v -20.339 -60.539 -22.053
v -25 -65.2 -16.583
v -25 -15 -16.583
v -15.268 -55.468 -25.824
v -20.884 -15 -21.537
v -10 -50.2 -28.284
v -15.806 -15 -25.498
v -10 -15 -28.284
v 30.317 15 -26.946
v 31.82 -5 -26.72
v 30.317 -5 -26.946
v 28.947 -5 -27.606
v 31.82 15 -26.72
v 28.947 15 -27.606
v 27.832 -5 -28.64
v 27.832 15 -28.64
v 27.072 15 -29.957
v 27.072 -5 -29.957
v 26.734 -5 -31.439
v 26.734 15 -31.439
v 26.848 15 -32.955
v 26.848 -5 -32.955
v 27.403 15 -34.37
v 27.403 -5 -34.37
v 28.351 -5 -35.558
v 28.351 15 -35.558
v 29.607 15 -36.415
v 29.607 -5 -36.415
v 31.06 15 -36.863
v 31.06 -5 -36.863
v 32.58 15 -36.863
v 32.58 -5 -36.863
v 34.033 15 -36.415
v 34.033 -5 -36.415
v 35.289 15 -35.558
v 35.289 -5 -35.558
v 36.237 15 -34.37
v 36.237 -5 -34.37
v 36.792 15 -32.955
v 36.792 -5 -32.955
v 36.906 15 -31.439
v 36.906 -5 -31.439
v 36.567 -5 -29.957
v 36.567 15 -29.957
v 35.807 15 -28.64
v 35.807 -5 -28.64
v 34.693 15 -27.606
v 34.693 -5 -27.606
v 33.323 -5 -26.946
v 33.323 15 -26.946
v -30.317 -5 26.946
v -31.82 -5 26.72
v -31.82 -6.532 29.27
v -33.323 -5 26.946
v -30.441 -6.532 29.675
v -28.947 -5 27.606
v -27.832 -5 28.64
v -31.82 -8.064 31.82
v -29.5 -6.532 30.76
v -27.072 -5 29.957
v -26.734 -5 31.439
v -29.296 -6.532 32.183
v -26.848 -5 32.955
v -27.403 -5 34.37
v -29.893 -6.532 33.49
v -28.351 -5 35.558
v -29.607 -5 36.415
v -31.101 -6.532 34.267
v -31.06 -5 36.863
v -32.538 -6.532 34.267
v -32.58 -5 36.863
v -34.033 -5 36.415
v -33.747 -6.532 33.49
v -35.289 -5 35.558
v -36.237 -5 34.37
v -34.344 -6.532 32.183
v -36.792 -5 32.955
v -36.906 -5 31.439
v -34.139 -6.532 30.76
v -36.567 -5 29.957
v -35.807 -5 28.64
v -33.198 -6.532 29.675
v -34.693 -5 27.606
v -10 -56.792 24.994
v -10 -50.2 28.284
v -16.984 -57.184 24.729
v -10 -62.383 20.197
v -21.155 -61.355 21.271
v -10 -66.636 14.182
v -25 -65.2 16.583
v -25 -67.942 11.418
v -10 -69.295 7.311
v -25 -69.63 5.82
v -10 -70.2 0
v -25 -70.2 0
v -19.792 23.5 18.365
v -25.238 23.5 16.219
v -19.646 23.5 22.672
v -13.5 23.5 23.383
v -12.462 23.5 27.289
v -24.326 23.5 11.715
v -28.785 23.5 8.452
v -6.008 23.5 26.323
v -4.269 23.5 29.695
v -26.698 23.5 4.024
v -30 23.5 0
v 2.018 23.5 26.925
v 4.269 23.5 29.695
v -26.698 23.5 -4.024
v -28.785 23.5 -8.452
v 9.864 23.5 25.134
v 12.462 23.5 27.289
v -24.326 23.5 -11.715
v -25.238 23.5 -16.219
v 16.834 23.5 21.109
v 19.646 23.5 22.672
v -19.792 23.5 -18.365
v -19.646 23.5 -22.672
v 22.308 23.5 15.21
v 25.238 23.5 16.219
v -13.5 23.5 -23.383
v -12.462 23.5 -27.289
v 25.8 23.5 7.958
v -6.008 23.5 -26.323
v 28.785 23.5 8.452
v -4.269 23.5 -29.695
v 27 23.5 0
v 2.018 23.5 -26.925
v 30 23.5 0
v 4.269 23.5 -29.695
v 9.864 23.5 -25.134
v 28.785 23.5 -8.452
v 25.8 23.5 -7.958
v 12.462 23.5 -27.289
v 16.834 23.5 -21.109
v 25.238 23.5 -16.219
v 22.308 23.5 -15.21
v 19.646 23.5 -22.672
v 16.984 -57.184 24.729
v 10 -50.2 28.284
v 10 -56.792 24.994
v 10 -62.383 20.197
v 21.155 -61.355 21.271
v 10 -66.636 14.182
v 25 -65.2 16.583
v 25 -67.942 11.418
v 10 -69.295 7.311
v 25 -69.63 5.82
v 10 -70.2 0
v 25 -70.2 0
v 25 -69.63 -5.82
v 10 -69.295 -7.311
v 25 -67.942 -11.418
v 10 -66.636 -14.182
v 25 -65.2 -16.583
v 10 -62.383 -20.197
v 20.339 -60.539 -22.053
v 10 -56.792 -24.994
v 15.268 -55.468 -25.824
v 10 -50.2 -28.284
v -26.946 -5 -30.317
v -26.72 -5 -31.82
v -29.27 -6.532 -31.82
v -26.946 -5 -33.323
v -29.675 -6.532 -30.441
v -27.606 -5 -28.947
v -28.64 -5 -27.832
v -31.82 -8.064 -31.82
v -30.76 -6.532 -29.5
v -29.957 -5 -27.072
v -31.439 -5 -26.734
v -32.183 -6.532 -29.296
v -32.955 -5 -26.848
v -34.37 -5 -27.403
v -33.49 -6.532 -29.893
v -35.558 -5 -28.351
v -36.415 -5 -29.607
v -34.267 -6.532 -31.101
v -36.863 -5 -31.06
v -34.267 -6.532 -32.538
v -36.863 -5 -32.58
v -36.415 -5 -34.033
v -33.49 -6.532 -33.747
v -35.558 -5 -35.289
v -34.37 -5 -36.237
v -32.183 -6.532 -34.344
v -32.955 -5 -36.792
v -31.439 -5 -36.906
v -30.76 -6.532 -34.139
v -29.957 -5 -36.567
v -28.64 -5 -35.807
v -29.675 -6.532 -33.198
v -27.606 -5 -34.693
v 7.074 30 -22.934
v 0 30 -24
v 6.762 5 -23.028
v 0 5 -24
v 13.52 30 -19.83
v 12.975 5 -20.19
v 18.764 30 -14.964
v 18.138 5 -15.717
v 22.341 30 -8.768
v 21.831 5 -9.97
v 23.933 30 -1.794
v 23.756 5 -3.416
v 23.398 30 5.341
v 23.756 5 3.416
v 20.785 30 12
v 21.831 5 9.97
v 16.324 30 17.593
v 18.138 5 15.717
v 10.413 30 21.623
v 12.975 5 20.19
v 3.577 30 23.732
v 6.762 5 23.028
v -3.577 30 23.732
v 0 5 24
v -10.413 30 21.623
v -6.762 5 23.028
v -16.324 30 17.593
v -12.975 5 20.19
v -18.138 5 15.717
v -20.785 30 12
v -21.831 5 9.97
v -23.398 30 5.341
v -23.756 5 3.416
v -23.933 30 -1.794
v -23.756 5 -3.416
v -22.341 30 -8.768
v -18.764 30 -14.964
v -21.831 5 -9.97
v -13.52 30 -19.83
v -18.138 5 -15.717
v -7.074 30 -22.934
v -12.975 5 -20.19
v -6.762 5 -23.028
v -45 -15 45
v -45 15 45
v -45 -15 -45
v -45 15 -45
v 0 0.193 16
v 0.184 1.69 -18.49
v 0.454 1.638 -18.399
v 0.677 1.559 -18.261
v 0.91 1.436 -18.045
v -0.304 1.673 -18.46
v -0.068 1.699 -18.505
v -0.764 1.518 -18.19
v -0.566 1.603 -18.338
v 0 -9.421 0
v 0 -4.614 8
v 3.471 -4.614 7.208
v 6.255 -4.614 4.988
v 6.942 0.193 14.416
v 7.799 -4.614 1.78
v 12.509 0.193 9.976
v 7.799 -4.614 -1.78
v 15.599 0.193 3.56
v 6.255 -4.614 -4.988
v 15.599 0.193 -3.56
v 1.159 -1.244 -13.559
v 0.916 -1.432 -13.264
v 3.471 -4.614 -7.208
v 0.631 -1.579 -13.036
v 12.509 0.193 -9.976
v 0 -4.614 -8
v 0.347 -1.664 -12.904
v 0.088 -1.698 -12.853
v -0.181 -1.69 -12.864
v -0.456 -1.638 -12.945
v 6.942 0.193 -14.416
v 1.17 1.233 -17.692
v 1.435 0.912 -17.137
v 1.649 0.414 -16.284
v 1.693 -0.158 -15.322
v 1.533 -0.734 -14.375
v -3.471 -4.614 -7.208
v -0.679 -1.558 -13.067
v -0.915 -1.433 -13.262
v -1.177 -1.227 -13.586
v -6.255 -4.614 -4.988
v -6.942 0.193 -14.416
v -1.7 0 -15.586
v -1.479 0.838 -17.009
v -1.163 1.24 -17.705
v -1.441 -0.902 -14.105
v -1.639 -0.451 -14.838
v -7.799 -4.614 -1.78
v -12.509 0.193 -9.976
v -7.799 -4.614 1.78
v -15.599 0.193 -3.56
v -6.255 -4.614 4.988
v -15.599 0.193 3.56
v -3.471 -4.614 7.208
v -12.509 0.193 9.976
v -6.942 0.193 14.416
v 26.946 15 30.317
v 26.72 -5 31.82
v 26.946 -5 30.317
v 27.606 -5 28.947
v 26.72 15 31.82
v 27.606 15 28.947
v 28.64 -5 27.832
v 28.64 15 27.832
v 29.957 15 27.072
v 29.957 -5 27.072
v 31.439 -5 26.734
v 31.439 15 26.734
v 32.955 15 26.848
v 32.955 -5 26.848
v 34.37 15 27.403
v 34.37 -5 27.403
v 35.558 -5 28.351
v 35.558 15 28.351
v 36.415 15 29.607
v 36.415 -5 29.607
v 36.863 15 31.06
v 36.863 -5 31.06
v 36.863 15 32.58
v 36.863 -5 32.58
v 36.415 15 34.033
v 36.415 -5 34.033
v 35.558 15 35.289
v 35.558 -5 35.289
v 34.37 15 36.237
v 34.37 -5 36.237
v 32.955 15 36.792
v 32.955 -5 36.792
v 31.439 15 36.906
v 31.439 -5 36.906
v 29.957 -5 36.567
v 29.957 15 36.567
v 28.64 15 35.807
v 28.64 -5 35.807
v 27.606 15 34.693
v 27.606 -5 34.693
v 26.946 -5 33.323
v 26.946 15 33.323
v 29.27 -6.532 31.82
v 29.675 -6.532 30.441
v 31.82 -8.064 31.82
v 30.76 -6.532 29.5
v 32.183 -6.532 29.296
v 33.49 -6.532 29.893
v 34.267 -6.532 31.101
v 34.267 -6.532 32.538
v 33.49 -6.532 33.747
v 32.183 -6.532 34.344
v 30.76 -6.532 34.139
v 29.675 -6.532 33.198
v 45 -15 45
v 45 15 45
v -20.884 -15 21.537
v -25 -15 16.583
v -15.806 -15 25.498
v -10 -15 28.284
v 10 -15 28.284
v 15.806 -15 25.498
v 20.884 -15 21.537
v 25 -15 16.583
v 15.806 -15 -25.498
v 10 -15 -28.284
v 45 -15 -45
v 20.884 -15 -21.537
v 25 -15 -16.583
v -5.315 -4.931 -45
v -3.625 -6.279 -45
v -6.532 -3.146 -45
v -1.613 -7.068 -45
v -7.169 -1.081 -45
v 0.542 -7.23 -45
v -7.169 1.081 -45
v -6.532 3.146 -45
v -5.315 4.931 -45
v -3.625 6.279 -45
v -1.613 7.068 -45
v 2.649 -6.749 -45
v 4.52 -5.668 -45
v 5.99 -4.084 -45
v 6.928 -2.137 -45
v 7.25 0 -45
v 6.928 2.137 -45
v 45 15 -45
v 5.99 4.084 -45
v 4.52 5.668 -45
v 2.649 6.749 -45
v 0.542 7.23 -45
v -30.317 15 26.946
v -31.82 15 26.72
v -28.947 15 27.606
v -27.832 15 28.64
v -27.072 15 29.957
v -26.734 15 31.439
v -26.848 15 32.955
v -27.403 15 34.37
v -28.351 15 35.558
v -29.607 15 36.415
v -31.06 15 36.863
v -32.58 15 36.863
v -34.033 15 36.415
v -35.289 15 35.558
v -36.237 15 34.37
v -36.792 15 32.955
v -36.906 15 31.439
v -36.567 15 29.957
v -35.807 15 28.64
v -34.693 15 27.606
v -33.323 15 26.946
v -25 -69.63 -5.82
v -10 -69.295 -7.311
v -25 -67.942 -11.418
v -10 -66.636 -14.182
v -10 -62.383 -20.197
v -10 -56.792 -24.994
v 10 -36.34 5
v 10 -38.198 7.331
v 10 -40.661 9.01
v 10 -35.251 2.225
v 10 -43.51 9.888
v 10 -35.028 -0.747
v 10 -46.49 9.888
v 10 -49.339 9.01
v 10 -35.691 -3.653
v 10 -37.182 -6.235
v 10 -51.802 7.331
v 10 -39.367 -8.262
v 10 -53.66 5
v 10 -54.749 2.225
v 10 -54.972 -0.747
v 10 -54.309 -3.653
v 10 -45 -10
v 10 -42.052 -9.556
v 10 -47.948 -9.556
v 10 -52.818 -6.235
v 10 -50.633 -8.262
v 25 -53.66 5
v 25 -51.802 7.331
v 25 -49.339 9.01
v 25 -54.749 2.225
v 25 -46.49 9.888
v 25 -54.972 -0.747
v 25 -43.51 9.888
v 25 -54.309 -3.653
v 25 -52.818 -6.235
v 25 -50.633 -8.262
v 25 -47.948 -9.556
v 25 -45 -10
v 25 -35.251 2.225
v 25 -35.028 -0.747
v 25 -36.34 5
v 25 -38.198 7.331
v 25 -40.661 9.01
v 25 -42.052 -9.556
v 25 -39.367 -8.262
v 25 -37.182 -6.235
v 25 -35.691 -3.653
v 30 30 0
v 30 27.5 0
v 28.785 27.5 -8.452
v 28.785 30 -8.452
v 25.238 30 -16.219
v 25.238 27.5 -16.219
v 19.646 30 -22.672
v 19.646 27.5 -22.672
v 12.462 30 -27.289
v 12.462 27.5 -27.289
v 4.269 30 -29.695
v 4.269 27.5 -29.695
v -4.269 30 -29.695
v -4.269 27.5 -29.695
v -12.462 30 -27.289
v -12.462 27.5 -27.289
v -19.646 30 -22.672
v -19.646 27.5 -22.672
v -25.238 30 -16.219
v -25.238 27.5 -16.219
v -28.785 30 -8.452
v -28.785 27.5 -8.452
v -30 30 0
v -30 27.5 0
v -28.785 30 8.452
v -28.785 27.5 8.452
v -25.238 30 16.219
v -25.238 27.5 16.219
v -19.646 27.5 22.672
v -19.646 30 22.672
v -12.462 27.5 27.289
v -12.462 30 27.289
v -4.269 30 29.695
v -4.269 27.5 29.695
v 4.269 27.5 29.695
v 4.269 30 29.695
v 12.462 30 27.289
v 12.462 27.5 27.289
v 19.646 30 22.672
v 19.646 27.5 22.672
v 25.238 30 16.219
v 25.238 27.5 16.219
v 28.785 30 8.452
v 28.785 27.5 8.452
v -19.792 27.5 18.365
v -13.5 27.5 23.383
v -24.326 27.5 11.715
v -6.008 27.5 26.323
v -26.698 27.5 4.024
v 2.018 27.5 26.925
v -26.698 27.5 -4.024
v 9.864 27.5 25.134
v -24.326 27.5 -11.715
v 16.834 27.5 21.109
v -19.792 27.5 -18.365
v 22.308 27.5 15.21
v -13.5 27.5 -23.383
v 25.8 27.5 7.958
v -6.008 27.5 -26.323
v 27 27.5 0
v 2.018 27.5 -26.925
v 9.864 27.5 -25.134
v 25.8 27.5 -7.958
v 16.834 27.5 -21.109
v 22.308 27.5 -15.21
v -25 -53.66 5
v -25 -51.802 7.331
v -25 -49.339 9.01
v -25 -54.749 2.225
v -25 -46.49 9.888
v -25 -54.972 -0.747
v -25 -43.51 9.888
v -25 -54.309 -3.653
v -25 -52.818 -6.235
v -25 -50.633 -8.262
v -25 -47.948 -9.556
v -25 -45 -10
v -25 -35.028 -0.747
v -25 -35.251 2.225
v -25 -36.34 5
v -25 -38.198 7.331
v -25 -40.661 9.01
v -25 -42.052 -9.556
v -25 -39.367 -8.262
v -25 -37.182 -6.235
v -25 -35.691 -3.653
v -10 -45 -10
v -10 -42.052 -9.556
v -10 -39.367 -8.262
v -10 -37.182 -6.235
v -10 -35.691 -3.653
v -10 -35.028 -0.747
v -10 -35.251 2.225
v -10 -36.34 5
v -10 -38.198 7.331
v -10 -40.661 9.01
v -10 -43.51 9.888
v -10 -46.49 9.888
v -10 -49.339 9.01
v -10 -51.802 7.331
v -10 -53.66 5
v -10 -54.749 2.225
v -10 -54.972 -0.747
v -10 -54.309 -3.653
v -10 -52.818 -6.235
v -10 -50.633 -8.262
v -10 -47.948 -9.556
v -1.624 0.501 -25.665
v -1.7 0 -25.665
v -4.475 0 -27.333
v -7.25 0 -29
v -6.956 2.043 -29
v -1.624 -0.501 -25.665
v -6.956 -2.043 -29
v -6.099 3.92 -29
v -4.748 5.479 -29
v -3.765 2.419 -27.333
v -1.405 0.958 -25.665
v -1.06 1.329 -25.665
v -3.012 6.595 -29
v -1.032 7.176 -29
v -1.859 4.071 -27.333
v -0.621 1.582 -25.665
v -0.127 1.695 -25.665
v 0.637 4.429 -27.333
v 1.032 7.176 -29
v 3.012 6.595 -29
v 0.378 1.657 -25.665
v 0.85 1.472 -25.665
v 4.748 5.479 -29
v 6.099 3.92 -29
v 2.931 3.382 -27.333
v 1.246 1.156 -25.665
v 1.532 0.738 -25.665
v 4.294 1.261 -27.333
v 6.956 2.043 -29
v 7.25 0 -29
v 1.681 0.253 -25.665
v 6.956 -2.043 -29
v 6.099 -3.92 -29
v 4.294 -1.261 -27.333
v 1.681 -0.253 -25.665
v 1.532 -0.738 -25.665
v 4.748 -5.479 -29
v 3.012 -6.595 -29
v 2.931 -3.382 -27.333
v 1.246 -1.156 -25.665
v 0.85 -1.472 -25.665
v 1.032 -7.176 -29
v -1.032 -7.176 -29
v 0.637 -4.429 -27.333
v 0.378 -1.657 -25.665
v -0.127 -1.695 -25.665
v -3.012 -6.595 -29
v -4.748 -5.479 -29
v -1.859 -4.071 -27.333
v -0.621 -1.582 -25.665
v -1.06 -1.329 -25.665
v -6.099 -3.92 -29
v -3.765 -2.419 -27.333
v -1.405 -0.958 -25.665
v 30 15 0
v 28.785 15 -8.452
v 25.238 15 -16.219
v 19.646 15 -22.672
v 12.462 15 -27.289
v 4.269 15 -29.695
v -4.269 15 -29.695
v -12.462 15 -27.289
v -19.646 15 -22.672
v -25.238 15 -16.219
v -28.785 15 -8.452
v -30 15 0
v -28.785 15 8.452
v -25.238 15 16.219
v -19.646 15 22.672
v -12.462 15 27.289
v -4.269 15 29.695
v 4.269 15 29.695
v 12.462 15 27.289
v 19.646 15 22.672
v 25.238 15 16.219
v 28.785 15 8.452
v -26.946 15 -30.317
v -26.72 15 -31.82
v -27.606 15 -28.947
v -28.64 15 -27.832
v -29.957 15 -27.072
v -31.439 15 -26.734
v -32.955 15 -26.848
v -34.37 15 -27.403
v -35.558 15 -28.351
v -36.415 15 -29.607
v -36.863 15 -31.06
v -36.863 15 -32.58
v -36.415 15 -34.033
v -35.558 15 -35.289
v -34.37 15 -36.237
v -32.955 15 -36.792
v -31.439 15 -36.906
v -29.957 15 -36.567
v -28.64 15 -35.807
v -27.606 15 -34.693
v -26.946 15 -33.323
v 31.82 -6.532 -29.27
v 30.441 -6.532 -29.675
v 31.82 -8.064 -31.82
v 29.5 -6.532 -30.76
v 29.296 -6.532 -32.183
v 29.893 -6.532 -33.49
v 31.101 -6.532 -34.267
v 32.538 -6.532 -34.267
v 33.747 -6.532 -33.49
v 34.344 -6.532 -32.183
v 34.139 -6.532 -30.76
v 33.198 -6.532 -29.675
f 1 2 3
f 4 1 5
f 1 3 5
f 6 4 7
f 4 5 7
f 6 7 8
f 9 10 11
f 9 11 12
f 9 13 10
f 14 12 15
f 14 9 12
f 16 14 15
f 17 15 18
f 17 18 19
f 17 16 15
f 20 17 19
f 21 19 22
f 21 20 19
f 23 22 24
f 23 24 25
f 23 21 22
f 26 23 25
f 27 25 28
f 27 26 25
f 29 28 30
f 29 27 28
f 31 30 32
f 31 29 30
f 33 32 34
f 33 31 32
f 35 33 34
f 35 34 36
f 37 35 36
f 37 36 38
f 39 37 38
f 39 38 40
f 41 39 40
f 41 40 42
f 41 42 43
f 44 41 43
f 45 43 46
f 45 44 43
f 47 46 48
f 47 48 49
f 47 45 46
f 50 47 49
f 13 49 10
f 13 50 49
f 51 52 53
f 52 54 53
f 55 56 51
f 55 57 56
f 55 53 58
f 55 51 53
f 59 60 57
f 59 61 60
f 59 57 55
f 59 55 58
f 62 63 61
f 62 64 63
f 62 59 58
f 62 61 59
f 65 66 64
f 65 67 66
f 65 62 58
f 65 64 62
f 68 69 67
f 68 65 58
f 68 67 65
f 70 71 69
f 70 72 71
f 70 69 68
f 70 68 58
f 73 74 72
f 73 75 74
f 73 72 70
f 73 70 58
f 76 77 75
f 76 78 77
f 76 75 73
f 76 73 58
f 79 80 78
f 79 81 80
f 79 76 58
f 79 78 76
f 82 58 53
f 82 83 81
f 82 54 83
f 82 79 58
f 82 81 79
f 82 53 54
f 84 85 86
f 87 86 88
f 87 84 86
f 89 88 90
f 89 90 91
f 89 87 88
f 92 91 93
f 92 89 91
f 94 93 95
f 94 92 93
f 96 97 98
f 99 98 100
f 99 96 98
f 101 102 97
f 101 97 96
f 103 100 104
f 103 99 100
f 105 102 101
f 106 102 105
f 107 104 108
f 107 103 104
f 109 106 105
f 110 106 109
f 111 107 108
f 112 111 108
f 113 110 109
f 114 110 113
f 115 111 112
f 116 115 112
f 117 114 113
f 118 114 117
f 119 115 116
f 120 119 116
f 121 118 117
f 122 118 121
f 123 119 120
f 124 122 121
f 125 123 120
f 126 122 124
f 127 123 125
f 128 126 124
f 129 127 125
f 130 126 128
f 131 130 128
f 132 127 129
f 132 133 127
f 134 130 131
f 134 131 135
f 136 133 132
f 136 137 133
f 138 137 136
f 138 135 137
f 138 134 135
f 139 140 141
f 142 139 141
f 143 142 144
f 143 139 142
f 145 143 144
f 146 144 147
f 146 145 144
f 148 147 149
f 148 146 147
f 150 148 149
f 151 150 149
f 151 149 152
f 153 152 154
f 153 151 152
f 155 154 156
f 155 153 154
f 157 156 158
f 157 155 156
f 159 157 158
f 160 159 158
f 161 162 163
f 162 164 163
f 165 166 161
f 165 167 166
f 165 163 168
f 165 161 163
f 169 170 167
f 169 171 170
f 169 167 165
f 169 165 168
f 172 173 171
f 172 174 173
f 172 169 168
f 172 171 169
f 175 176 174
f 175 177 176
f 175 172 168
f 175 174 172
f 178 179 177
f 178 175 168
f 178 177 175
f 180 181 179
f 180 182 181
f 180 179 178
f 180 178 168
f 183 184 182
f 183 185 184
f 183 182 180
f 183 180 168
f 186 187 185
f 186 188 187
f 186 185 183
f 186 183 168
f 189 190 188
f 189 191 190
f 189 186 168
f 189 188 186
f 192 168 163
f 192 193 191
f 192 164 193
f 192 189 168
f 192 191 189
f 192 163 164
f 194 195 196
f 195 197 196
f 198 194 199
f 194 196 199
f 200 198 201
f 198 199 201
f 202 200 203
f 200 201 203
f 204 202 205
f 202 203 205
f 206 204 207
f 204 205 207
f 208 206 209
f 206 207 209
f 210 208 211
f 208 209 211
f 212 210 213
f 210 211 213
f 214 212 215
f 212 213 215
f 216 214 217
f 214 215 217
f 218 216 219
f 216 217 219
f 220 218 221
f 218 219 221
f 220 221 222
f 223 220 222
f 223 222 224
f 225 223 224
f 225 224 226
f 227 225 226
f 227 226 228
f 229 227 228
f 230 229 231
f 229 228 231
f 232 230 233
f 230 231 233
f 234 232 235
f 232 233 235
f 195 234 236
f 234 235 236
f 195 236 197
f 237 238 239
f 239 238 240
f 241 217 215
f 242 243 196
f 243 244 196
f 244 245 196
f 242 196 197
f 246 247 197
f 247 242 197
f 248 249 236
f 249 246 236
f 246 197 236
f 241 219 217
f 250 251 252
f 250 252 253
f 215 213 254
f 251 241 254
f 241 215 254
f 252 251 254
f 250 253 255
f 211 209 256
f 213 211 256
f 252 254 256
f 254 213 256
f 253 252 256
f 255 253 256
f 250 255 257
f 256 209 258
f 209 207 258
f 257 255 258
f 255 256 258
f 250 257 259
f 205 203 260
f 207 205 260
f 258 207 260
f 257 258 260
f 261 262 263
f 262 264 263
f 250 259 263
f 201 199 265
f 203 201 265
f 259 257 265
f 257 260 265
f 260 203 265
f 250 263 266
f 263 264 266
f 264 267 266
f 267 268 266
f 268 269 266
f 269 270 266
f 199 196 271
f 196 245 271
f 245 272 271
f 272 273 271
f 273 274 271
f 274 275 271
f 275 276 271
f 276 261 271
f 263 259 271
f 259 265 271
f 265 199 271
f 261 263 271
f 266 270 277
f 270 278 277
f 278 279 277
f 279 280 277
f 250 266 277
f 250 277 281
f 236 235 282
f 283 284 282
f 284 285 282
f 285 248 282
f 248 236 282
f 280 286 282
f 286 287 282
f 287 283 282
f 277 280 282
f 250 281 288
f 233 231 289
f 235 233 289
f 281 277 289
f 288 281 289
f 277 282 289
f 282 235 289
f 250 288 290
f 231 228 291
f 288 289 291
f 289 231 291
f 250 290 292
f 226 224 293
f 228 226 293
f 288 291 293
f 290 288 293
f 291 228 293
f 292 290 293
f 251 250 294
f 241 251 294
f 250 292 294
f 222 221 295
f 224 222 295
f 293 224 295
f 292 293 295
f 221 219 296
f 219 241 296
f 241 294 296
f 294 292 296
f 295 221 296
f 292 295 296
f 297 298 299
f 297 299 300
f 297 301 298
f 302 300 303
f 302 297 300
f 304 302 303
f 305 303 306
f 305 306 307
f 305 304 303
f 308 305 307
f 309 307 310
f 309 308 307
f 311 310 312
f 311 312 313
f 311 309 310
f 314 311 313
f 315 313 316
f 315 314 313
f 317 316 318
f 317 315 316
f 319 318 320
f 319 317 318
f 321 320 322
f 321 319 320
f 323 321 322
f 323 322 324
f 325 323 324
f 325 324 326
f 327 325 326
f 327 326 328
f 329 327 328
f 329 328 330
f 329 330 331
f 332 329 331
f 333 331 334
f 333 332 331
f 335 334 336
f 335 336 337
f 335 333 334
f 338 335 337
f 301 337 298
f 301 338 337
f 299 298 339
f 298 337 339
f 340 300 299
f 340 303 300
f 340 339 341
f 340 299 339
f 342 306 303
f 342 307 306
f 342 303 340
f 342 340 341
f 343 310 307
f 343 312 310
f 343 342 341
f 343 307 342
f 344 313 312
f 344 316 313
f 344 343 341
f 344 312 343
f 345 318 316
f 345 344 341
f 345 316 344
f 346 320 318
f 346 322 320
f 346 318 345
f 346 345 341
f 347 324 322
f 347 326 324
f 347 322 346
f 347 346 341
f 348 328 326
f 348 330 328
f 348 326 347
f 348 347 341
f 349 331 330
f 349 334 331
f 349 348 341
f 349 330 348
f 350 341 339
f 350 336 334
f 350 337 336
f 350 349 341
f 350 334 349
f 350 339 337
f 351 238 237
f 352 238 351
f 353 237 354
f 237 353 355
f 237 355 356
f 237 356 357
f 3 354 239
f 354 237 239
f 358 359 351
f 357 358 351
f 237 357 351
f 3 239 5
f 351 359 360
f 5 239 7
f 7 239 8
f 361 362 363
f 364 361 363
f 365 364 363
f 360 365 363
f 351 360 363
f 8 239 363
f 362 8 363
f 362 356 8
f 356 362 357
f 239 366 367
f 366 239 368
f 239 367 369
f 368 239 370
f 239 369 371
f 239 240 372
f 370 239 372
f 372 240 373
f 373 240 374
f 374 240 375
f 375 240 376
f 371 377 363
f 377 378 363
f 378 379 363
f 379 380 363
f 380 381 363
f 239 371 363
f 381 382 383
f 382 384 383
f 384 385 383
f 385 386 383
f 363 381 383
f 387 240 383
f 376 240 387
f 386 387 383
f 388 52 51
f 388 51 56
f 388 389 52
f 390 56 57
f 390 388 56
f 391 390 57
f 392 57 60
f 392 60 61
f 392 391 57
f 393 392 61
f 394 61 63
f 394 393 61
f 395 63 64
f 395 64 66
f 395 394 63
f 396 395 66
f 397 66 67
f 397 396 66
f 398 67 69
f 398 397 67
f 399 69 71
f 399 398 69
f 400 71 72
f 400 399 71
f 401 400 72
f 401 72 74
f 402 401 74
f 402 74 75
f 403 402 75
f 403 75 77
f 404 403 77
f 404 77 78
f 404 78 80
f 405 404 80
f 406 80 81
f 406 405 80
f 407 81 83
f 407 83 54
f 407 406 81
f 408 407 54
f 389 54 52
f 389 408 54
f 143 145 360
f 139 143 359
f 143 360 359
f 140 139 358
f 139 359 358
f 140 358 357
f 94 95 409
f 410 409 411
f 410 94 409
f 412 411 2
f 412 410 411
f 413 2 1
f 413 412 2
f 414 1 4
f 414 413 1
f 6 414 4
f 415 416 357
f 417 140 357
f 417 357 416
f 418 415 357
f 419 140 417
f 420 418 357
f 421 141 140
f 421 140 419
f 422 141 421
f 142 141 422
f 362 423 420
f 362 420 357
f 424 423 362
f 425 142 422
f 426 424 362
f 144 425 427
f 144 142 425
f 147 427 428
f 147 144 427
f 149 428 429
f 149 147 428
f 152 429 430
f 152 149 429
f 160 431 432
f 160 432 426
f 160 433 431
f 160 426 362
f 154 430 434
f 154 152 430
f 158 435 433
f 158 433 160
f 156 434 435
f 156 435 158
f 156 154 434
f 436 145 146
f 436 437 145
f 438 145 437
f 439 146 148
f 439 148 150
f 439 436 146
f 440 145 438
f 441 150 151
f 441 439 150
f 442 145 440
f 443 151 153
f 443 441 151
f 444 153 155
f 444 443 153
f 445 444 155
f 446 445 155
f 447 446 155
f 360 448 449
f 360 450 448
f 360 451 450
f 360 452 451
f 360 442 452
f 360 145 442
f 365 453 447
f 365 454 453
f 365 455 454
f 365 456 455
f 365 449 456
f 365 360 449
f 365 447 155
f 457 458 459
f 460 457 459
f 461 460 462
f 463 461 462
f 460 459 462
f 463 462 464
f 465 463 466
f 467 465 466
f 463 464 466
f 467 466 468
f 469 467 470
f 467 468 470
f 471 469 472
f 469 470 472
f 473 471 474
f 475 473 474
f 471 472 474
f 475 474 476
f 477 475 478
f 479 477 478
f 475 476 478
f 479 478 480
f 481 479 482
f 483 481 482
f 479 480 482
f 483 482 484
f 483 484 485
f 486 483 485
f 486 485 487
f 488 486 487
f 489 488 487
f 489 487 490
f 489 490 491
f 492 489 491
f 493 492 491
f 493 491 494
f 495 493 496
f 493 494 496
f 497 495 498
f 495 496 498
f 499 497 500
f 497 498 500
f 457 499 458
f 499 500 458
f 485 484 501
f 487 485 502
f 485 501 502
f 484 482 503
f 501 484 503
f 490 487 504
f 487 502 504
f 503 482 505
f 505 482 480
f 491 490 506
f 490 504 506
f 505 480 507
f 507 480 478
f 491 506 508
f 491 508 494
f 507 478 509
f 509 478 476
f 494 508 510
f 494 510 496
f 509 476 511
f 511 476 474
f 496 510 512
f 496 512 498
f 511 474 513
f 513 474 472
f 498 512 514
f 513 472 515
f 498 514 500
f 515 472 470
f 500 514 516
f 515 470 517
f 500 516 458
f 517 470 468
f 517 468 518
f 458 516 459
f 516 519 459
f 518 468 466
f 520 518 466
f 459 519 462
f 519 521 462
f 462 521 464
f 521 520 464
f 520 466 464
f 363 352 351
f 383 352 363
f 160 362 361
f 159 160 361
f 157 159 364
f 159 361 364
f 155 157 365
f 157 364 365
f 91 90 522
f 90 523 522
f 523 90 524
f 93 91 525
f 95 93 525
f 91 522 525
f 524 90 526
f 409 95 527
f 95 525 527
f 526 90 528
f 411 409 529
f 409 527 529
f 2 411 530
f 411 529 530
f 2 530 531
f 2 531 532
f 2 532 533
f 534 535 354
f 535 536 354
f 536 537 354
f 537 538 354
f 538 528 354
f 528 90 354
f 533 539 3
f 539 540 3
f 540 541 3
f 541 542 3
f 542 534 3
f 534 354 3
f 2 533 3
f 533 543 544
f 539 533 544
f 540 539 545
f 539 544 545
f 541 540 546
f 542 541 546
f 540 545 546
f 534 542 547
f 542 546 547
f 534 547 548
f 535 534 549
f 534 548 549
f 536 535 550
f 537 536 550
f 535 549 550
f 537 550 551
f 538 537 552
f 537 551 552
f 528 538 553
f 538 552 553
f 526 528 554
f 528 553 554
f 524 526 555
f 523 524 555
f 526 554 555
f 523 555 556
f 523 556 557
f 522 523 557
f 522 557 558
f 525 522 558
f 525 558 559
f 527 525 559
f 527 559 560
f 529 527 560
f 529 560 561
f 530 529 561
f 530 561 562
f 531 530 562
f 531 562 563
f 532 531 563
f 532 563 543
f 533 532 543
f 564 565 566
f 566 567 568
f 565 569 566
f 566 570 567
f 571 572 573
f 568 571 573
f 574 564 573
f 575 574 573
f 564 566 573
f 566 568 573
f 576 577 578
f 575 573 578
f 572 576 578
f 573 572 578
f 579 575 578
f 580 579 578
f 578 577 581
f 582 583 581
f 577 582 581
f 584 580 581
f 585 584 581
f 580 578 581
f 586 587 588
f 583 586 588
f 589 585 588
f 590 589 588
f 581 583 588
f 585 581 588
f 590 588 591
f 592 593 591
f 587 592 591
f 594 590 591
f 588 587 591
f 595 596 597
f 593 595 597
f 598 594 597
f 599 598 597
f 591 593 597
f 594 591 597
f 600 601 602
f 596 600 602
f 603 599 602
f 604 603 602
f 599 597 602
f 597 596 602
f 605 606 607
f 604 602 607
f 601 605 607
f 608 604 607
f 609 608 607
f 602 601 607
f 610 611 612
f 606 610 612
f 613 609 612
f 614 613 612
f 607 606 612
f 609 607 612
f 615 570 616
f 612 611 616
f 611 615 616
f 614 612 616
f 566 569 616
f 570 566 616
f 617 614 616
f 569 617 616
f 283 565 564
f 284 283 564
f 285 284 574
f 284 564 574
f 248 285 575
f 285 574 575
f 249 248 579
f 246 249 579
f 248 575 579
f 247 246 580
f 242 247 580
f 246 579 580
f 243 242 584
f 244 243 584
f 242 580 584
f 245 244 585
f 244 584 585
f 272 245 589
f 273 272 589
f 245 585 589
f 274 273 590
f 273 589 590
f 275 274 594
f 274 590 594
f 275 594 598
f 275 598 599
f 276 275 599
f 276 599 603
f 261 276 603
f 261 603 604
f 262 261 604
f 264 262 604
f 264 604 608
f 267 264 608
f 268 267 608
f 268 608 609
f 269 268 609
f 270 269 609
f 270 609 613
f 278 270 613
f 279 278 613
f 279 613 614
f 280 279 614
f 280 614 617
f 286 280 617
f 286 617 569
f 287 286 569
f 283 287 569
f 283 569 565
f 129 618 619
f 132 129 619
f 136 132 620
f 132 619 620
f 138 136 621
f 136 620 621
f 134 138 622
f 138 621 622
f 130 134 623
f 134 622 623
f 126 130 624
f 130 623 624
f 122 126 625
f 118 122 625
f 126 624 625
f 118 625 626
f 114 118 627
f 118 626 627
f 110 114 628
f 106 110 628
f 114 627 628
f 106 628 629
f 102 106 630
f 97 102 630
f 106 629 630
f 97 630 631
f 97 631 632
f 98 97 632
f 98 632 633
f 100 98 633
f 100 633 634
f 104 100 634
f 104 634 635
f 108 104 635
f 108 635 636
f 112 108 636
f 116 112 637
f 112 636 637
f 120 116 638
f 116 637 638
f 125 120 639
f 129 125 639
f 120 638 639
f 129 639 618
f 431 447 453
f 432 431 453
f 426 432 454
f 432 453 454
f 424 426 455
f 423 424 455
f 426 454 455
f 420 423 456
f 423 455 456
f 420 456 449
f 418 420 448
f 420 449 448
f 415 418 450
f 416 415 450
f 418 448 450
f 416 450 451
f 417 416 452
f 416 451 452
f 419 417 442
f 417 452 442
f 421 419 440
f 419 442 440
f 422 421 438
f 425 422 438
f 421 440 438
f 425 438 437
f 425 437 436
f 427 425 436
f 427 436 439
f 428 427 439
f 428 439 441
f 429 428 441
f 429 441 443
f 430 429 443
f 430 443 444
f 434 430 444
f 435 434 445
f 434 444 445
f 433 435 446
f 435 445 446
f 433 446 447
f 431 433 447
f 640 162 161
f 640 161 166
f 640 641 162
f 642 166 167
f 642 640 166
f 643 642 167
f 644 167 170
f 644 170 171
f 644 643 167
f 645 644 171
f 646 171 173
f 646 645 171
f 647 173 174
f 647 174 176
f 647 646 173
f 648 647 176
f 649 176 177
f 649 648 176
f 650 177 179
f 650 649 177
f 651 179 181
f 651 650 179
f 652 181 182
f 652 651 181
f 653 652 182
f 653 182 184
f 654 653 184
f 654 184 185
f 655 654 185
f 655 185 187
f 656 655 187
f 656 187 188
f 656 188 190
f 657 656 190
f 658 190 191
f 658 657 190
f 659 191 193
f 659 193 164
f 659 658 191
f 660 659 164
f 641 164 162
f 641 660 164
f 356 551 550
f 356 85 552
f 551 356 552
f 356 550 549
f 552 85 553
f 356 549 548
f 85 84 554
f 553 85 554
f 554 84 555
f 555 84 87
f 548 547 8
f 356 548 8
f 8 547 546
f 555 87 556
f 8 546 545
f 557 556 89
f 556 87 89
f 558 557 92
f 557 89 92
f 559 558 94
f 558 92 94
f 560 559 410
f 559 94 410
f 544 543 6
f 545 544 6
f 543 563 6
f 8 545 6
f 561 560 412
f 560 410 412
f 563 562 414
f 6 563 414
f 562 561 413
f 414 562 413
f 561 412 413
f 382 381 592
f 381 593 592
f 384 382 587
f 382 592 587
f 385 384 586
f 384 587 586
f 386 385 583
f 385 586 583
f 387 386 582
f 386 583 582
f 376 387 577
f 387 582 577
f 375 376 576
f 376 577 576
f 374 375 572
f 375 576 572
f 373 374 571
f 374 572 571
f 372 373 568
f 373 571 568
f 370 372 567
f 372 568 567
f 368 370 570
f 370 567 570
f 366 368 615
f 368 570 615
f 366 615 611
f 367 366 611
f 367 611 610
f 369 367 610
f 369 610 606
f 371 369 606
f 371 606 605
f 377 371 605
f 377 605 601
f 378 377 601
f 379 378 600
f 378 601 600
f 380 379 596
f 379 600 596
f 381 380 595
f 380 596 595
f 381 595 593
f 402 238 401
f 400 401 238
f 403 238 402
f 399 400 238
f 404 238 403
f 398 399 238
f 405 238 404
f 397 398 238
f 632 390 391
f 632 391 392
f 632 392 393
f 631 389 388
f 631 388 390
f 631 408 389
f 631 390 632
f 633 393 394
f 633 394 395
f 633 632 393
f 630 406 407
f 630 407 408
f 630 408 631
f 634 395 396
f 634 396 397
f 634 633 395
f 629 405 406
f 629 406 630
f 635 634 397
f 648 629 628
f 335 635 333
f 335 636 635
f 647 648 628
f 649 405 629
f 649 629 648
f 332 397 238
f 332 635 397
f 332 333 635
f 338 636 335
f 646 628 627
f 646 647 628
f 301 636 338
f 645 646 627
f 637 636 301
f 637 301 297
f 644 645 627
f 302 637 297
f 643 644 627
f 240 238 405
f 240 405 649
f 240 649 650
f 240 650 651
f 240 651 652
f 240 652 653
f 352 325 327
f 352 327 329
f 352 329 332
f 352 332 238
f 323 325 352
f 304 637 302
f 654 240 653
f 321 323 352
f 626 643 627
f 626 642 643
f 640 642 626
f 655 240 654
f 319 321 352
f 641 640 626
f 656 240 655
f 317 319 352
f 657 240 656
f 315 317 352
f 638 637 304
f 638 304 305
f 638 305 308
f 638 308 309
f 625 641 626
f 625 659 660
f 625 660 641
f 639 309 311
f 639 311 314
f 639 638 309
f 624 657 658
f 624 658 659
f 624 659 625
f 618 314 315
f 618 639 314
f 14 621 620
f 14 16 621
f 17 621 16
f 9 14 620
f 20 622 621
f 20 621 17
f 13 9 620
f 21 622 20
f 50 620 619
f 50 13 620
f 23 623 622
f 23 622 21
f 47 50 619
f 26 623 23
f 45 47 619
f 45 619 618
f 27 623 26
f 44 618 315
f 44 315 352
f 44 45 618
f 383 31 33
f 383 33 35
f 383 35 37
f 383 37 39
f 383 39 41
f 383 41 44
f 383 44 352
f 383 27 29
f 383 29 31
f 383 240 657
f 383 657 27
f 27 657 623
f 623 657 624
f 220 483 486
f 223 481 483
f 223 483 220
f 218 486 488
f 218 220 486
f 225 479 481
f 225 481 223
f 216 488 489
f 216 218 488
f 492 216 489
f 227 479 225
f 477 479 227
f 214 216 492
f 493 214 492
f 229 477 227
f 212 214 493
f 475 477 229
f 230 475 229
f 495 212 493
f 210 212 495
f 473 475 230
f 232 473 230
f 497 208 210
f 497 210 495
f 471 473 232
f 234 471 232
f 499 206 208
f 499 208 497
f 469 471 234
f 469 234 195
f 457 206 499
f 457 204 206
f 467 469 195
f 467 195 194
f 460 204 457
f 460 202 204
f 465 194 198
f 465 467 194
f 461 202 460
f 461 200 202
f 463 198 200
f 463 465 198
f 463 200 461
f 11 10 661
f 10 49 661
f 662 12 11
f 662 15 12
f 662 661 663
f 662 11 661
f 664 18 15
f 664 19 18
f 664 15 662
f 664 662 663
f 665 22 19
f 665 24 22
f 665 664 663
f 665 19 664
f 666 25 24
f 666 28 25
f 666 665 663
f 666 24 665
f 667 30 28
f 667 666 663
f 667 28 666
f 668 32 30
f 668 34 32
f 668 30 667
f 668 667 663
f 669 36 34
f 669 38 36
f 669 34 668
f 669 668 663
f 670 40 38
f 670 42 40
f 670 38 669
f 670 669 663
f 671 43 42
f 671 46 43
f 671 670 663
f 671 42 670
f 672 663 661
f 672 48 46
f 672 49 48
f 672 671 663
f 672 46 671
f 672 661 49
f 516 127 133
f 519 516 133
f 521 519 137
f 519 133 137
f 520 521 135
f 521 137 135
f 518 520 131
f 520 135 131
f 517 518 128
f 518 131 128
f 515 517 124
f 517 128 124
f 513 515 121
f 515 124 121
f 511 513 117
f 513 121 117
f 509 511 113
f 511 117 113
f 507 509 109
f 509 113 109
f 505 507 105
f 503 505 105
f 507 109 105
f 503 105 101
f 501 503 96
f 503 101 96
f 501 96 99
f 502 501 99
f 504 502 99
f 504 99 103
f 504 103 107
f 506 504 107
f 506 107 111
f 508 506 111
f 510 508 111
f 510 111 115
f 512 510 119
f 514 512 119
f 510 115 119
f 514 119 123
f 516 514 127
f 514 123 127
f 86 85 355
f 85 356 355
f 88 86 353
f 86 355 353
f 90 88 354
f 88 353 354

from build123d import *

# Parameters (mm, degrees)
SKETCH1_W                          = 90
SKETCH1_H                          = 90
BOSS_EXTRUDE1_DEPTH                = 15
SKETCH2_R                          = 30
BOSS_EXTRUDE2_DEPTH                = 8.5
SKETCH3_R                          = 27
BOSS_EXTRUDE3_DEPTH                = 4
SKETCH4_R                          = 30
BOSS_EXTRUDE4_DEPTH                = 2.5
SKETCH5_R                          = 30
BOSS_EXTRUDE5_DEPTH                = 55.2
SKETCH6_R                          = 10
CUT_EXTRUDE1_DEPTH                 = 46
CUT_EXTRUDE1_DEPTH_BACK            = 46
SKETCH7_W                          = 20
SKETCH7_H                          = 64.311961004
CUT_EXTRUDE2_DEPTH                 = 55.2
SKETCH8_OUTSIDE_W                  = 124.398
SKETCH8_OUTSIDE_H                  = 124.398
SKETCH8_OUTSIDE_W_2                = 50
SKETCH8_OUTSIDE_H_2                = 73.670791152
CUT_EXTRUDE3_DEPTH                 = 60
CUT_EXTRUDE5_DEPTH                 = 21
CUT_EXTRUDE5_DEPTH_BACK            = 71
TAP_DRILL_FOR_M1_2X0_25_TAP1_D     = 48
TAP_DRILL_FOR_M1_2X0_25_TAP1_DEPTH = 25
TAP_DRILL_FOR_M1_2X0_25_TAP1_TIP   = 14.420654857
CIRPATTERN1_COUNT                  = 4
M16X1_5_TAPPED_HOLE1_D             = 14.5
M16X1_5_TAPPED_HOLE1_DEPTH         = 16
M16X1_5_TAPPED_HOLE1_TIP           = 4.356239488
SKETCH18_R                         = 1.7
CUT_EXTRUDE6_DEPTH                 = 46


with BuildPart() as part:
    # Sketch1 → Boss-Extrude1 (new body, symmetric)
    with BuildSketch(Plane(origin=(0, 0, 0), x_dir=(1, 0, 0), z_dir=(0, 1, 0))):
        Rectangle(SKETCH1_W, SKETCH1_H)
    extrude(amount=BOSS_EXTRUDE1_DEPTH, both=True)

    # Sketch2 → Boss-Extrude2 (add)
    with BuildSketch(Plane(origin=(0, 15, 0), x_dir=(1, 0, 0), z_dir=(0, 1, 0))):
        Circle(SKETCH2_R)
    extrude(amount=BOSS_EXTRUDE2_DEPTH)

    # Sketch3 → Boss-Extrude3 (add)
    with BuildSketch(Plane(origin=(0, 23.5, 0), x_dir=(1, 0, 0), z_dir=(0, 1, 0))):
        Circle(SKETCH3_R)
    extrude(amount=BOSS_EXTRUDE3_DEPTH)

    # Sketch4 → Boss-Extrude4 (add)
    with BuildSketch(Plane(origin=(0, 27.5, 0), x_dir=(1, 0, 0), z_dir=(0, 1, 0))):
        Circle(SKETCH4_R)
    extrude(amount=BOSS_EXTRUDE4_DEPTH)

    # Sketch5 → Boss-Extrude5 (add)
    with BuildSketch(Plane(origin=(0, -15, 0), x_dir=(-1, 0, 0), z_dir=(0, -1, 0))):
        Circle(SKETCH5_R)
    extrude(amount=BOSS_EXTRUDE5_DEPTH)

    # Sketch6 → Cut-Extrude1 (cut, two sides)
    with BuildSketch(Plane(origin=(0, 0, 0), x_dir=(0, 0, -1), z_dir=(1, 0, 0))) as cut_extrude1_sk:
        with Locations((0, -45)):
            Circle(SKETCH6_R)
    extrude(amount=CUT_EXTRUDE1_DEPTH, mode=Mode.SUBTRACT)
    extrude(cut_extrude1_sk.sketch, amount=-CUT_EXTRUDE1_DEPTH_BACK, mode=Mode.SUBTRACT)

    # Sketch7 → Cut-Extrude2 (cut)
    with BuildSketch(Plane(origin=(0, -70.2, 0), x_dir=(-1, 0, 0), z_dir=(0, -1, 0))):
        Rectangle(SKETCH7_W, SKETCH7_H)
    extrude(amount=-CUT_EXTRUDE2_DEPTH, mode=Mode.SUBTRACT)

    # Sketch8 outside → Cut-Extrude3 (cut)
    with BuildSketch(Plane(origin=(0, -15, 0), x_dir=(-1, 0, 0), z_dir=(0, -1, 0))):
        Rectangle(SKETCH8_OUTSIDE_W, SKETCH8_OUTSIDE_H)
        Rectangle(SKETCH8_OUTSIDE_W_2, SKETCH8_OUTSIDE_H_2, mode=Mode.SUBTRACT)
    extrude(amount=CUT_EXTRUDE3_DEPTH, mode=Mode.SUBTRACT)

    # Sketch10 → Cut-Extrude5 (cut, two sides)
    with BuildSketch(Plane(origin=(25, 0, 0), x_dir=(0, 0, -1), z_dir=(1, 0, 0))) as cut_extrude5_sk:
        with BuildLine():
            Line((28.284271247, -82.924550927), (-28.284271247, -82.924550927))
            Line((-28.284271247, -82.924550927), (-28.284271247, -50.2))
            ThreePointArc((-28.284271247, -50.2), (-17.320508076, -64.694897428), (0, -70.2))
            ThreePointArc((0, -70.2), (17.320508076, -64.694897428), (28.284271247, -50.2))
            Line((28.284271247, -50.2), (28.284271247, -82.924550927))
        make_face()
    extrude(amount=CUT_EXTRUDE5_DEPTH, mode=Mode.SUBTRACT)
    extrude(cut_extrude5_sk.sketch, amount=-CUT_EXTRUDE5_DEPTH_BACK, mode=Mode.SUBTRACT)

    # Tap Drill for M1.2x0.25 Tap1
    with Locations(Plane.ZX.offset(30)):
        with Locations((0, 0)):
            Hole(TAP_DRILL_FOR_M1_2X0_25_TAP1_D / 2, depth=TAP_DRILL_FOR_M1_2X0_25_TAP1_DEPTH)
            with Locations((0, 0, -(TAP_DRILL_FOR_M1_2X0_25_TAP1_DEPTH + TAP_DRILL_FOR_M1_2X0_25_TAP1_TIP / 2))):  # 118° drill point
                Cone(0, TAP_DRILL_FOR_M1_2X0_25_TAP1_D / 2, TAP_DRILL_FOR_M1_2X0_25_TAP1_TIP, mode=Mode.SUBTRACT)

    # Sketch15 → M12 Tapped Hole1 (revolve, cut)
    with BuildSketch(Plane(origin=(31.819805153, 15, -31.819805153), x_dir=(0, 0, 1), z_dir=(1, 0, 0))):
        Polygon((0, 0), (0, 23.064389157), (5.1, 20), (5.1, 0), align=None)
    m12_tapped_hole1 = revolve(axis=Axis((31.819805153, 21.35, -31.819805153), (0, -1, 0)), mode=Mode.SUBTRACT)

    # CirPattern1: M12 Tapped Hole1 ×4 about axis
    cirpattern1_axis = Axis((0, 0, 0), (0, 1, 0))
    for i in range(1, CIRPATTERN1_COUNT):
        add(m12_tapped_hole1.rotate(cirpattern1_axis, i * 360 / CIRPATTERN1_COUNT), mode=Mode.SUBTRACT)

    # M16x1.5 Tapped Hole1
    with Locations(Plane(origin=(0, 0, -45), x_dir=(-1, 0, 0), z_dir=(0, 0, -1))):
        with Locations((0, 0)):
            Hole(M16X1_5_TAPPED_HOLE1_D / 2, depth=M16X1_5_TAPPED_HOLE1_DEPTH)
            with Locations((0, 0, -(M16X1_5_TAPPED_HOLE1_DEPTH + M16X1_5_TAPPED_HOLE1_TIP / 2))):  # 118° drill point
                Cone(0, M16X1_5_TAPPED_HOLE1_D / 2, M16X1_5_TAPPED_HOLE1_TIP, mode=Mode.SUBTRACT)

    # Sketch18 → Cut-Extrude6 (cut)
    with BuildSketch(Plane(origin=(0, 0, -45), x_dir=(-1, 0, 0), z_dir=(0, 0, -1))):
        Circle(SKETCH18_R)
    extrude(amount=-CUT_EXTRUDE6_DEPTH, mode=Mode.SUBTRACT)


solid = part.part
